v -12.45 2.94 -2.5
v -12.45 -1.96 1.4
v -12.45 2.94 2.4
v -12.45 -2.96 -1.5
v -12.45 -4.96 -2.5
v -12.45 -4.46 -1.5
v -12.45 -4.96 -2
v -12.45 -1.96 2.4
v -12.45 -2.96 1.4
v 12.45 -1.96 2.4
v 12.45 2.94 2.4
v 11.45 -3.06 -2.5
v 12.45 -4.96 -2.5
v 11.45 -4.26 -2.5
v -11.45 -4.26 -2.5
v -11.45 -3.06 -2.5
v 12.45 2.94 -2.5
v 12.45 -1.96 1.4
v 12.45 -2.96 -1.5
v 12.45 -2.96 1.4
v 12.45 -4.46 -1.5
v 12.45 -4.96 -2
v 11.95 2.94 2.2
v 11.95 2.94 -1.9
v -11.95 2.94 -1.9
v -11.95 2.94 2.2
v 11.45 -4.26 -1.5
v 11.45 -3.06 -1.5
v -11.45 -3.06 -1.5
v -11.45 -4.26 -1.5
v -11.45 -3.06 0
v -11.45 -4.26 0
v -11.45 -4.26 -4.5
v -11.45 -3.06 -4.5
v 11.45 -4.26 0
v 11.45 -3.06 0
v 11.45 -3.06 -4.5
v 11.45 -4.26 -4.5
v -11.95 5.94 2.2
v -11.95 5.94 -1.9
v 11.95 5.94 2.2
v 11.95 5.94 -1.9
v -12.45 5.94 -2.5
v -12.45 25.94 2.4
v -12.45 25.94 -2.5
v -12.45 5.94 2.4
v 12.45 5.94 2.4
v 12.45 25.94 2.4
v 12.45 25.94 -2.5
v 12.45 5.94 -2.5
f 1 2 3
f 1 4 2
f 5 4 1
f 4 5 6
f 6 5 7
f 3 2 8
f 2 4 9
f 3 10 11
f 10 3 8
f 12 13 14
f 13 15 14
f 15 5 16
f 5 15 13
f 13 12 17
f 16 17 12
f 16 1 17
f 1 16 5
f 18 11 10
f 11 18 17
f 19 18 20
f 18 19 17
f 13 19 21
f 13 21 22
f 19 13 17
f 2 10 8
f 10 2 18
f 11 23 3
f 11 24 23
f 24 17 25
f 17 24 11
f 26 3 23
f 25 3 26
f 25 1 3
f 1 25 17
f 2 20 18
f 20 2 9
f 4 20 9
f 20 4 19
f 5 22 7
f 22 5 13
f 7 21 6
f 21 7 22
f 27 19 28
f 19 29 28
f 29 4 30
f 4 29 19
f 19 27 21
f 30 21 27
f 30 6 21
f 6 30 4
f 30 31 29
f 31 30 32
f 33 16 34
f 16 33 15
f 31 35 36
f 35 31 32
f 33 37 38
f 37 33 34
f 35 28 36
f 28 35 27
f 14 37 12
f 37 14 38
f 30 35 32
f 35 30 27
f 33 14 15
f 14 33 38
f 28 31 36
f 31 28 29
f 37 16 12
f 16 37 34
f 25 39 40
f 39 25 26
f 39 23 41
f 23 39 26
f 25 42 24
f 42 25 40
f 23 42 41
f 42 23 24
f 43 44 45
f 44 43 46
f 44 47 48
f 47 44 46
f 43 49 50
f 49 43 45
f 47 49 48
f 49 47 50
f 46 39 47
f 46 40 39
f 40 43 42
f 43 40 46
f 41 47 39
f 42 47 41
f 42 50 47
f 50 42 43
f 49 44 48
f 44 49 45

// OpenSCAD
N=9;
A=2.4+N*2.5;
rotate([0,0,180])
translate([-A/2,-2.94,-2.5])
{
	cube([A,4.9,4.9]);
	cube([A,5.9,3.9]);
	hull()
	{
		cube([A,7.4,1]);
		cube([A,7.9,0.5]);
	}
	translate([1,6,-2])cube([A-2,1.2,4.5]); // Assumes cropped pins
	// Plug
	translate([0.5,-20,0.6])cube([A-1,21,4.1]);
	translate([0,-23,0])cube([A,20,4.9]);
}
